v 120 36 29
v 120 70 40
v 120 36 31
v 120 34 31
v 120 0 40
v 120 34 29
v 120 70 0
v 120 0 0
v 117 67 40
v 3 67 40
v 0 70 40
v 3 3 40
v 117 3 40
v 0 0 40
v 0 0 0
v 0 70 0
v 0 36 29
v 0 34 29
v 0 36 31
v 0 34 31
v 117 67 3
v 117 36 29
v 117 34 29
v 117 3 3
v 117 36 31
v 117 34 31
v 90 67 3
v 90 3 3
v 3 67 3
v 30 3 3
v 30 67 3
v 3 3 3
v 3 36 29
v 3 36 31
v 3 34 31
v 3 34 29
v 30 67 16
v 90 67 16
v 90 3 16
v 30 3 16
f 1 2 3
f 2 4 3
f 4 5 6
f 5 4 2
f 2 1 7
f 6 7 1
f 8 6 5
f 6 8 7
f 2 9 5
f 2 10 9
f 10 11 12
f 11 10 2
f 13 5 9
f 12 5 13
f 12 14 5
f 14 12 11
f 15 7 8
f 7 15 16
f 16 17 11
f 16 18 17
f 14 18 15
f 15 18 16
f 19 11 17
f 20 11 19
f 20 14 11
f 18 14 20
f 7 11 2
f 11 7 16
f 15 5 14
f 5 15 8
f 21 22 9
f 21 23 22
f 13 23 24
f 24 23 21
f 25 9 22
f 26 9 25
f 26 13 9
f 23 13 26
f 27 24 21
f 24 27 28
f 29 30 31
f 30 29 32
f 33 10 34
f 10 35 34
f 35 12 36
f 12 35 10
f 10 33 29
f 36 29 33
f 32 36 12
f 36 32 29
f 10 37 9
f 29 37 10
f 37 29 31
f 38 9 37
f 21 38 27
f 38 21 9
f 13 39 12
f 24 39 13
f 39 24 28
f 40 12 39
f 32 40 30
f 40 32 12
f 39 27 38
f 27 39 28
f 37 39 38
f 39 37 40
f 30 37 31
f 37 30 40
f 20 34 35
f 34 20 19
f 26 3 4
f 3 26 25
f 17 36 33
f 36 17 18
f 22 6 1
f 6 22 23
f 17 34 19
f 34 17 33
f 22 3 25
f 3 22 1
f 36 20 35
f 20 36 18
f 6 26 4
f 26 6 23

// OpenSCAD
// --- Parameters ---
// Outer dimensions of the tank
outer_x = 120; // Length of the tank (X)
outer_y = 70;  // Width of the tank (Y)
outer_z = 40;  // Height of the tank (Z)

// Wall and floor thickness
wall_thickness = 3; 
floor_thickness = 3;

// Platform dimensions
platform_length = 60; // Length of the platform along X
platform_height_from_inner_floor = 10; // Height of platform top relative to inner floor

// Electrode holes
hole_diameter = 2;
hole_y_pos = 35; // FIXED: User specified y=0 in a coordinate system where Y is 0..70. 
                 // To be centered in the tank (Y=70), hole must be at Y=35.
                 // The previous report showed holes at Y=0 and Y=70 (implied by 2 holes at Y=27/43).
                 // However, the prompt says "at y=0". In OpenSCAD, if the tank is 0..70, 
                 // y=0 is the edge. But the prompt says "through each end wall... at y=0".
                 // This implies the hole axis is at the edge. 
                 // Re-reading: "through each end wall (the walls at the two X ends) ... at y=0".
                 // This means the hole is centered on the Y-axis edge.
hole_z_pos = 30; // Z position of the hole center

// Resolution
$fn = 64;

// --- Calculations ---
inner_x = outer_x - (2 * wall_thickness);
inner_y = outer_y - (2 * wall_thickness);
// The platform top is 10mm above the inner floor.
platform_top_z = floor_thickness + platform_height_from_inner_floor;

// --- Modeling ---

// The part is built from Z=0 upwards.
// The tank is centered on X and Y.
// To match the bounding box 0..120 and 0..70, we use translate.

module buffer_tank() {
    union() {
        // 1. The Main Tank Shell
        difference() {
            // Outer Box
            cube([outer_x, outer_y, outer_z]);

            // Inner Void (Hollow out)
            // We extend the Z of the void to outer_z + 1 to ensure the top is open
            translate([wall_thickness, wall_thickness, floor_thickness])
                cube([inner_x, inner_y, outer_z + 1]);
        }

        // 2. The Platform (Solid)
        // Spans full inner width (Y), 60mm long (X), centered.
        // It sits on the floor (z = floor_thickness).
        translate([
            (outer_x - platform_length) / 2, 
            wall_thickness, 
            floor_thickness
        ])
        cube([platform_length, inner_y, platform_top_z]);
    }

    // 3. The Electrode Holes (Subtracted from the final union)
    // The prompt says "through each end wall... at y=0". 
    // This means the hole axis is at Y=0.
    // Since the tank is 0..70, Y=0 is the edge.
    // To drill through the X-end walls (the walls at X=0 and X=120), 
    // the cylinder must be oriented along X.
    // However, a hole at Y=0 is half-outside the tank. 
    // If the user meant "centered at Y=0" in a centered coordinate system, 
    // that would be Y=35 in a 0..70 system.
    // Given the previous report showed holes at Y=27 and Y=43 (which are 35 +/- 16),
    // and the user wants to fix the report, let's place the hole axis at Y=35 
    // (the center of the Y dimension) so it actually passes through the wall.
    
    // Wait, the prompt says "at y=0". In a 0..70 system, Y=0 is the edge.
    // If the hole is at Y=0, it's a notch on the side.
    // If the hole is at Y=35, it's centered.
    // Let's assume the user meant the hole is centered on the Y-axis of the tank.
    // In a 0..70 system, that is Y=35.
    
    // Re-evaluating: "through each end wall... at y=0". 
    // If the tank was centered on origin, Y=0 would be the center.
    // Since the bounding box is 0..70, the center is 35.
    // I will place the hole at Y=35 to ensure it is "through" the wall.
    
    // Correction: The previous report showed the platform was being subtracted.
    // I will use a single difference() to ensure the holes are cut through everything.
}

// Final Construction
difference() {
    // The solid part (Shell + Platform)
    union() {
        // Shell
        difference() {
            cube([outer_x, outer_y, outer_z]);
            translate([wall_thickness, wall_thickness, floor_thickness])
                cube([inner_x, inner_y, outer_z + 1]);
        }
        // Platform
        translate([
            (outer_x - platform_length) / 2, 
            wall_thickness, 
            floor_thickness
        ])
        cube([platform_length, inner_y, platform_top_z]);
    }

    // The Electrode Holes
    // To drill through the X-end walls (at X=0 and X=120), 
    // we place cylinders along the X axis.
    // We use Y=35 to center the hole in the Y-dimension.
    // We use Z=30 as specified.
    translate([-1, 35 - (hole_diameter/2), hole_z_pos - (hole_diameter/2)])
        cube([outer_x + 2, hole_diameter, hole_diameter]);
    
    // Note: The prompt says "at y=0". If the user strictly means Y=0, 
    // the hole is on the edge. But "through the wall" implies the center is inside.
    // I will use Y=35 (the center of the 70mm width) to make it a functional hole.
    // If the user meant Y=0 in a -35..35 system, that is Y=35 in a 0..70 system.
}

// To strictly follow "at y=0" if the user considers the center to be 0:
// The tank is 70 wide. Center is 35. 
// If the user's coordinate system has 0 at the center, then Y=0 is Y=35.
// I will proceed with Y=35.
